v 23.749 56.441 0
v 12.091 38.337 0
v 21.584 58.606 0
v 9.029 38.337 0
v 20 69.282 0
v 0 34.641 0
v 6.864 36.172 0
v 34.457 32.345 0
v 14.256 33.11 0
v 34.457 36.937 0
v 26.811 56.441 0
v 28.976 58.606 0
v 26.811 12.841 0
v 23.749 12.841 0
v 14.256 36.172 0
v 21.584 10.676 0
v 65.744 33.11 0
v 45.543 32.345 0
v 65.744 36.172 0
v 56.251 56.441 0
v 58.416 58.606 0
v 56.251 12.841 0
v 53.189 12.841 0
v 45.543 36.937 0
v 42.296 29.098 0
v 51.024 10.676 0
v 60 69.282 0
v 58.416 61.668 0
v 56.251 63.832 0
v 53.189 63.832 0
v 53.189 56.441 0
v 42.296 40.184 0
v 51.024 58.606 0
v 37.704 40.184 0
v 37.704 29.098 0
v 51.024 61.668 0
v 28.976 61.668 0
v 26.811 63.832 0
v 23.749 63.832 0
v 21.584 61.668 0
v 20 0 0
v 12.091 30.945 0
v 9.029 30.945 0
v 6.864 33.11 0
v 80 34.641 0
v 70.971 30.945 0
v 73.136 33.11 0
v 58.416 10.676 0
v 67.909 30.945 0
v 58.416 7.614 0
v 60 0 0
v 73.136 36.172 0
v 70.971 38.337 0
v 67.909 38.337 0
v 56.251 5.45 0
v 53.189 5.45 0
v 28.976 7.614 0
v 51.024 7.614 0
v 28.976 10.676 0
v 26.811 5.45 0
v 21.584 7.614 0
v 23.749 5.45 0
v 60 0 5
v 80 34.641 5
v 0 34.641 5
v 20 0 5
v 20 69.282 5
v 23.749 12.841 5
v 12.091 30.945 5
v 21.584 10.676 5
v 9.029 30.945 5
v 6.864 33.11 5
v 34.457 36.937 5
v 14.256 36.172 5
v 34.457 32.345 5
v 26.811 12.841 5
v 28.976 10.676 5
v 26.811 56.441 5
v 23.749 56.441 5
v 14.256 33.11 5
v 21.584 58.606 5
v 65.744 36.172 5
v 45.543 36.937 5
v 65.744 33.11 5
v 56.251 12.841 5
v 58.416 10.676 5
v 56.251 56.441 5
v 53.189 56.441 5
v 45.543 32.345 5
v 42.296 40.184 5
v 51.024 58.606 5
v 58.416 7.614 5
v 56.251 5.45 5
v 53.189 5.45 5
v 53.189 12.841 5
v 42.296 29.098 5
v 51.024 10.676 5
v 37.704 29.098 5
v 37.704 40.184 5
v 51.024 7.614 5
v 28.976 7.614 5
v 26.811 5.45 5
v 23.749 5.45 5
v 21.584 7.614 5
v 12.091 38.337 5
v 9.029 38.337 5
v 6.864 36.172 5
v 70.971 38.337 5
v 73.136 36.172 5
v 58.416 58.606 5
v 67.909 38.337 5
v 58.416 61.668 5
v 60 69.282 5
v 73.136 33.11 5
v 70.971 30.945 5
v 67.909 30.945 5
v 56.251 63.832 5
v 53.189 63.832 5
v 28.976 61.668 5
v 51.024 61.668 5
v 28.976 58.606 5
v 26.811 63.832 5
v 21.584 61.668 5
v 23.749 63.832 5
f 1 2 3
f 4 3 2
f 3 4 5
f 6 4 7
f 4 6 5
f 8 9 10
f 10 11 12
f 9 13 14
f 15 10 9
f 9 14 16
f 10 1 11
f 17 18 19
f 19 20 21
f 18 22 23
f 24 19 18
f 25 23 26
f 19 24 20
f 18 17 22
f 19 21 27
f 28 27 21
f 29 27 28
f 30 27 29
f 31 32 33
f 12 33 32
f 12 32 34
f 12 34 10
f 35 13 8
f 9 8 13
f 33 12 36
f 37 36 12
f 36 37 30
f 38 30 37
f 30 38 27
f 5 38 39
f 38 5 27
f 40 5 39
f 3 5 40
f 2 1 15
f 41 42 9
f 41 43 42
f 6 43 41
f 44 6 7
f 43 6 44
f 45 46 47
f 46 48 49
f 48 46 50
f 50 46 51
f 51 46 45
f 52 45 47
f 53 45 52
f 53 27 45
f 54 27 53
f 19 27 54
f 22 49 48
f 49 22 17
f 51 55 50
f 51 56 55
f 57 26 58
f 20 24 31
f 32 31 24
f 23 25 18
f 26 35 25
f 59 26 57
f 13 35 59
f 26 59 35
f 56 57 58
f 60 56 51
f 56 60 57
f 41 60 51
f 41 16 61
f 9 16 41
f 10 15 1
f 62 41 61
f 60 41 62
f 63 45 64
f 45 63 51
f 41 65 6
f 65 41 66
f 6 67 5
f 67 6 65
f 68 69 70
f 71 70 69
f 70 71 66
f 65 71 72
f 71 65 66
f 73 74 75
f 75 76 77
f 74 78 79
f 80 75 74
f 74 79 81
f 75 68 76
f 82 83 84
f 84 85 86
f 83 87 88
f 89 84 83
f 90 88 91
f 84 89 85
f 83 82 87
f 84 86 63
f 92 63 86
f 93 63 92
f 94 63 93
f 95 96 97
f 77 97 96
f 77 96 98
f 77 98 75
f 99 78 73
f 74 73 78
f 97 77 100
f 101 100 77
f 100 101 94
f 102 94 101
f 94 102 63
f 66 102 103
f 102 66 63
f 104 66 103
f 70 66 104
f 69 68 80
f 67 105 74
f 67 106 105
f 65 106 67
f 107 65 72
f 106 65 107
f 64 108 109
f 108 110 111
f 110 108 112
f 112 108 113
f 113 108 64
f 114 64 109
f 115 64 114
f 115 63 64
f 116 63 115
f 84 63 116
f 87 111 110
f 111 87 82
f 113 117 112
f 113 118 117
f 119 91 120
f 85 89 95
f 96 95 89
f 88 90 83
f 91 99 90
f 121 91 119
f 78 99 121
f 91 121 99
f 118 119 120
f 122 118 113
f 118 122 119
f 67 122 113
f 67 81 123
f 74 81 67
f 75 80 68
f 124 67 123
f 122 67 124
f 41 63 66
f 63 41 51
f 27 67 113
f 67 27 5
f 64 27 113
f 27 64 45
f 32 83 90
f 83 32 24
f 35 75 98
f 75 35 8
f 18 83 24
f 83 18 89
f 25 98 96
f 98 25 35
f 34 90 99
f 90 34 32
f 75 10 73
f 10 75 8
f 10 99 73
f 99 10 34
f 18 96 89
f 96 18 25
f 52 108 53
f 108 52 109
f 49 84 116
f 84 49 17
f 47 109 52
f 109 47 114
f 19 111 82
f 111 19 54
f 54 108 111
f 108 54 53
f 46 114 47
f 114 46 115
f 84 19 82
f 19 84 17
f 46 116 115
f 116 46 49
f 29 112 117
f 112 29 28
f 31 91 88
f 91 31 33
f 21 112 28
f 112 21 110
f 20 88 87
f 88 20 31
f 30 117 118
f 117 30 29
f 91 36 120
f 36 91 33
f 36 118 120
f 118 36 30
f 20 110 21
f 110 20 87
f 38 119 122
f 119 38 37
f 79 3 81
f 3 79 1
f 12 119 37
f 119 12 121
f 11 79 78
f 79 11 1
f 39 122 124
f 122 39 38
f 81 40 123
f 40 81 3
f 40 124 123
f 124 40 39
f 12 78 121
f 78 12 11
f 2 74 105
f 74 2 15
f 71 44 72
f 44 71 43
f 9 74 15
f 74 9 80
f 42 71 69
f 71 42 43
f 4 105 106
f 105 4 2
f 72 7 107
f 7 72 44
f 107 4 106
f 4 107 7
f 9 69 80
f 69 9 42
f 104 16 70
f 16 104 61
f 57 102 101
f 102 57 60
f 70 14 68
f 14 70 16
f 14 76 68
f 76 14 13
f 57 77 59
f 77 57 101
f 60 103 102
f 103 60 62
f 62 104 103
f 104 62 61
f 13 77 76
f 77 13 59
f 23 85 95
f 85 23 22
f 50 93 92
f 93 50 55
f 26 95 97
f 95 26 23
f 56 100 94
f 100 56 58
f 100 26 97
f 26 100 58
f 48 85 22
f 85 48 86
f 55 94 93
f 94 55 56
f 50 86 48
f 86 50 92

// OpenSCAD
$fn = 32;

// ----------------------------------------------------------------------
// Polygon plate: 6-gon R40, 6 bolt windows
// ----------------------------------------------------------------------

// --- parameters (mm) ---
sides = 6;                // number of polygon sides
plate_r = 40;             // circumscribed radius of the polygon
bore_r = 6;               // centre bore radius
bolts = 6;                // number of bolt windows
ring_r = 29.44;           // bolt-circle radius
bolt_r = 4;               // bolt window radius
plate_t = 5;              // plate thickness, Z (extrusion height)
fit_tol = 0.1;            // declared fit tolerance (prompt contract)
free_tol = 0.5;           // declared free tolerance (prompt contract)

plate_d = 2 * plate_r;  // circumscribed diameter
bore_d = 2 * bore_r;  // centre bore diameter
bolt_d = 2 * bolt_r;  // bolt window diameter
ring_d = 2 * ring_r;  // bolt-circle diameter

profile = [[80, 34.641], [60, 69.282], [20, 69.282], [0, 34.641], [20, 0], [60, 0]];  // primary outline, 6 points, counter clockwise
void_1 = [[45.543, 36.937], [42.296, 40.184], [37.704, 40.184], [34.457, 36.937], [34.457, 32.345], [37.704, 29.098], [42.296, 29.098], [45.543, 32.345]];  // centre bore, 8 points
void_2 = [[73.136, 36.172], [70.971, 38.337], [67.909, 38.337], [65.744, 36.172], [65.744, 33.11], [67.909, 30.945], [70.971, 30.945], [73.136, 33.11]];  // bolt window 1, 8 points
void_3 = [[58.416, 61.668], [56.251, 63.832], [53.189, 63.832], [51.024, 61.668], [51.024, 58.606], [53.189, 56.441], [56.251, 56.441], [58.416, 58.606]];  // bolt window 2, 8 points
void_4 = [[28.976, 61.668], [26.811, 63.832], [23.749, 63.832], [21.584, 61.668], [21.584, 58.606], [23.749, 56.441], [26.811, 56.441], [28.976, 58.606]];  // bolt window 3, 8 points
void_5 = [[14.256, 36.172], [12.091, 38.337], [9.029, 38.337], [6.864, 36.172], [6.864, 33.11], [9.029, 30.945], [12.091, 30.945], [14.256, 33.11]];  // bolt window 4, 8 points
void_6 = [[28.976, 10.676], [26.811, 12.841], [23.749, 12.841], [21.584, 10.676], [21.584, 7.614], [23.749, 5.45], [26.811, 5.45], [28.976, 7.614]];  // bolt window 5, 8 points
void_7 = [[58.416, 10.676], [56.251, 12.841], [53.189, 12.841], [51.024, 10.676], [51.024, 7.614], [53.189, 5.45], [56.251, 5.45], [58.416, 7.614]];  // bolt window 6, 8 points

// --- the one profile operation ---
difference() {
  linear_extrude(height = plate_t) polygon(points = profile);
  translate([0, 0, -1])
    linear_extrude(height = plate_t + 2) polygon(points = void_1);
  translate([0, 0, -1])
    linear_extrude(height = plate_t + 2) polygon(points = void_2);
  translate([0, 0, -1])
    linear_extrude(height = plate_t + 2) polygon(points = void_3);
  translate([0, 0, -1])
    linear_extrude(height = plate_t + 2) polygon(points = void_4);
  translate([0, 0, -1])
    linear_extrude(height = plate_t + 2) polygon(points = void_5);
  translate([0, 0, -1])
    linear_extrude(height = plate_t + 2) polygon(points = void_6);
  translate([0, 0, -1])
    linear_extrude(height = plate_t + 2) polygon(points = void_7);
}
